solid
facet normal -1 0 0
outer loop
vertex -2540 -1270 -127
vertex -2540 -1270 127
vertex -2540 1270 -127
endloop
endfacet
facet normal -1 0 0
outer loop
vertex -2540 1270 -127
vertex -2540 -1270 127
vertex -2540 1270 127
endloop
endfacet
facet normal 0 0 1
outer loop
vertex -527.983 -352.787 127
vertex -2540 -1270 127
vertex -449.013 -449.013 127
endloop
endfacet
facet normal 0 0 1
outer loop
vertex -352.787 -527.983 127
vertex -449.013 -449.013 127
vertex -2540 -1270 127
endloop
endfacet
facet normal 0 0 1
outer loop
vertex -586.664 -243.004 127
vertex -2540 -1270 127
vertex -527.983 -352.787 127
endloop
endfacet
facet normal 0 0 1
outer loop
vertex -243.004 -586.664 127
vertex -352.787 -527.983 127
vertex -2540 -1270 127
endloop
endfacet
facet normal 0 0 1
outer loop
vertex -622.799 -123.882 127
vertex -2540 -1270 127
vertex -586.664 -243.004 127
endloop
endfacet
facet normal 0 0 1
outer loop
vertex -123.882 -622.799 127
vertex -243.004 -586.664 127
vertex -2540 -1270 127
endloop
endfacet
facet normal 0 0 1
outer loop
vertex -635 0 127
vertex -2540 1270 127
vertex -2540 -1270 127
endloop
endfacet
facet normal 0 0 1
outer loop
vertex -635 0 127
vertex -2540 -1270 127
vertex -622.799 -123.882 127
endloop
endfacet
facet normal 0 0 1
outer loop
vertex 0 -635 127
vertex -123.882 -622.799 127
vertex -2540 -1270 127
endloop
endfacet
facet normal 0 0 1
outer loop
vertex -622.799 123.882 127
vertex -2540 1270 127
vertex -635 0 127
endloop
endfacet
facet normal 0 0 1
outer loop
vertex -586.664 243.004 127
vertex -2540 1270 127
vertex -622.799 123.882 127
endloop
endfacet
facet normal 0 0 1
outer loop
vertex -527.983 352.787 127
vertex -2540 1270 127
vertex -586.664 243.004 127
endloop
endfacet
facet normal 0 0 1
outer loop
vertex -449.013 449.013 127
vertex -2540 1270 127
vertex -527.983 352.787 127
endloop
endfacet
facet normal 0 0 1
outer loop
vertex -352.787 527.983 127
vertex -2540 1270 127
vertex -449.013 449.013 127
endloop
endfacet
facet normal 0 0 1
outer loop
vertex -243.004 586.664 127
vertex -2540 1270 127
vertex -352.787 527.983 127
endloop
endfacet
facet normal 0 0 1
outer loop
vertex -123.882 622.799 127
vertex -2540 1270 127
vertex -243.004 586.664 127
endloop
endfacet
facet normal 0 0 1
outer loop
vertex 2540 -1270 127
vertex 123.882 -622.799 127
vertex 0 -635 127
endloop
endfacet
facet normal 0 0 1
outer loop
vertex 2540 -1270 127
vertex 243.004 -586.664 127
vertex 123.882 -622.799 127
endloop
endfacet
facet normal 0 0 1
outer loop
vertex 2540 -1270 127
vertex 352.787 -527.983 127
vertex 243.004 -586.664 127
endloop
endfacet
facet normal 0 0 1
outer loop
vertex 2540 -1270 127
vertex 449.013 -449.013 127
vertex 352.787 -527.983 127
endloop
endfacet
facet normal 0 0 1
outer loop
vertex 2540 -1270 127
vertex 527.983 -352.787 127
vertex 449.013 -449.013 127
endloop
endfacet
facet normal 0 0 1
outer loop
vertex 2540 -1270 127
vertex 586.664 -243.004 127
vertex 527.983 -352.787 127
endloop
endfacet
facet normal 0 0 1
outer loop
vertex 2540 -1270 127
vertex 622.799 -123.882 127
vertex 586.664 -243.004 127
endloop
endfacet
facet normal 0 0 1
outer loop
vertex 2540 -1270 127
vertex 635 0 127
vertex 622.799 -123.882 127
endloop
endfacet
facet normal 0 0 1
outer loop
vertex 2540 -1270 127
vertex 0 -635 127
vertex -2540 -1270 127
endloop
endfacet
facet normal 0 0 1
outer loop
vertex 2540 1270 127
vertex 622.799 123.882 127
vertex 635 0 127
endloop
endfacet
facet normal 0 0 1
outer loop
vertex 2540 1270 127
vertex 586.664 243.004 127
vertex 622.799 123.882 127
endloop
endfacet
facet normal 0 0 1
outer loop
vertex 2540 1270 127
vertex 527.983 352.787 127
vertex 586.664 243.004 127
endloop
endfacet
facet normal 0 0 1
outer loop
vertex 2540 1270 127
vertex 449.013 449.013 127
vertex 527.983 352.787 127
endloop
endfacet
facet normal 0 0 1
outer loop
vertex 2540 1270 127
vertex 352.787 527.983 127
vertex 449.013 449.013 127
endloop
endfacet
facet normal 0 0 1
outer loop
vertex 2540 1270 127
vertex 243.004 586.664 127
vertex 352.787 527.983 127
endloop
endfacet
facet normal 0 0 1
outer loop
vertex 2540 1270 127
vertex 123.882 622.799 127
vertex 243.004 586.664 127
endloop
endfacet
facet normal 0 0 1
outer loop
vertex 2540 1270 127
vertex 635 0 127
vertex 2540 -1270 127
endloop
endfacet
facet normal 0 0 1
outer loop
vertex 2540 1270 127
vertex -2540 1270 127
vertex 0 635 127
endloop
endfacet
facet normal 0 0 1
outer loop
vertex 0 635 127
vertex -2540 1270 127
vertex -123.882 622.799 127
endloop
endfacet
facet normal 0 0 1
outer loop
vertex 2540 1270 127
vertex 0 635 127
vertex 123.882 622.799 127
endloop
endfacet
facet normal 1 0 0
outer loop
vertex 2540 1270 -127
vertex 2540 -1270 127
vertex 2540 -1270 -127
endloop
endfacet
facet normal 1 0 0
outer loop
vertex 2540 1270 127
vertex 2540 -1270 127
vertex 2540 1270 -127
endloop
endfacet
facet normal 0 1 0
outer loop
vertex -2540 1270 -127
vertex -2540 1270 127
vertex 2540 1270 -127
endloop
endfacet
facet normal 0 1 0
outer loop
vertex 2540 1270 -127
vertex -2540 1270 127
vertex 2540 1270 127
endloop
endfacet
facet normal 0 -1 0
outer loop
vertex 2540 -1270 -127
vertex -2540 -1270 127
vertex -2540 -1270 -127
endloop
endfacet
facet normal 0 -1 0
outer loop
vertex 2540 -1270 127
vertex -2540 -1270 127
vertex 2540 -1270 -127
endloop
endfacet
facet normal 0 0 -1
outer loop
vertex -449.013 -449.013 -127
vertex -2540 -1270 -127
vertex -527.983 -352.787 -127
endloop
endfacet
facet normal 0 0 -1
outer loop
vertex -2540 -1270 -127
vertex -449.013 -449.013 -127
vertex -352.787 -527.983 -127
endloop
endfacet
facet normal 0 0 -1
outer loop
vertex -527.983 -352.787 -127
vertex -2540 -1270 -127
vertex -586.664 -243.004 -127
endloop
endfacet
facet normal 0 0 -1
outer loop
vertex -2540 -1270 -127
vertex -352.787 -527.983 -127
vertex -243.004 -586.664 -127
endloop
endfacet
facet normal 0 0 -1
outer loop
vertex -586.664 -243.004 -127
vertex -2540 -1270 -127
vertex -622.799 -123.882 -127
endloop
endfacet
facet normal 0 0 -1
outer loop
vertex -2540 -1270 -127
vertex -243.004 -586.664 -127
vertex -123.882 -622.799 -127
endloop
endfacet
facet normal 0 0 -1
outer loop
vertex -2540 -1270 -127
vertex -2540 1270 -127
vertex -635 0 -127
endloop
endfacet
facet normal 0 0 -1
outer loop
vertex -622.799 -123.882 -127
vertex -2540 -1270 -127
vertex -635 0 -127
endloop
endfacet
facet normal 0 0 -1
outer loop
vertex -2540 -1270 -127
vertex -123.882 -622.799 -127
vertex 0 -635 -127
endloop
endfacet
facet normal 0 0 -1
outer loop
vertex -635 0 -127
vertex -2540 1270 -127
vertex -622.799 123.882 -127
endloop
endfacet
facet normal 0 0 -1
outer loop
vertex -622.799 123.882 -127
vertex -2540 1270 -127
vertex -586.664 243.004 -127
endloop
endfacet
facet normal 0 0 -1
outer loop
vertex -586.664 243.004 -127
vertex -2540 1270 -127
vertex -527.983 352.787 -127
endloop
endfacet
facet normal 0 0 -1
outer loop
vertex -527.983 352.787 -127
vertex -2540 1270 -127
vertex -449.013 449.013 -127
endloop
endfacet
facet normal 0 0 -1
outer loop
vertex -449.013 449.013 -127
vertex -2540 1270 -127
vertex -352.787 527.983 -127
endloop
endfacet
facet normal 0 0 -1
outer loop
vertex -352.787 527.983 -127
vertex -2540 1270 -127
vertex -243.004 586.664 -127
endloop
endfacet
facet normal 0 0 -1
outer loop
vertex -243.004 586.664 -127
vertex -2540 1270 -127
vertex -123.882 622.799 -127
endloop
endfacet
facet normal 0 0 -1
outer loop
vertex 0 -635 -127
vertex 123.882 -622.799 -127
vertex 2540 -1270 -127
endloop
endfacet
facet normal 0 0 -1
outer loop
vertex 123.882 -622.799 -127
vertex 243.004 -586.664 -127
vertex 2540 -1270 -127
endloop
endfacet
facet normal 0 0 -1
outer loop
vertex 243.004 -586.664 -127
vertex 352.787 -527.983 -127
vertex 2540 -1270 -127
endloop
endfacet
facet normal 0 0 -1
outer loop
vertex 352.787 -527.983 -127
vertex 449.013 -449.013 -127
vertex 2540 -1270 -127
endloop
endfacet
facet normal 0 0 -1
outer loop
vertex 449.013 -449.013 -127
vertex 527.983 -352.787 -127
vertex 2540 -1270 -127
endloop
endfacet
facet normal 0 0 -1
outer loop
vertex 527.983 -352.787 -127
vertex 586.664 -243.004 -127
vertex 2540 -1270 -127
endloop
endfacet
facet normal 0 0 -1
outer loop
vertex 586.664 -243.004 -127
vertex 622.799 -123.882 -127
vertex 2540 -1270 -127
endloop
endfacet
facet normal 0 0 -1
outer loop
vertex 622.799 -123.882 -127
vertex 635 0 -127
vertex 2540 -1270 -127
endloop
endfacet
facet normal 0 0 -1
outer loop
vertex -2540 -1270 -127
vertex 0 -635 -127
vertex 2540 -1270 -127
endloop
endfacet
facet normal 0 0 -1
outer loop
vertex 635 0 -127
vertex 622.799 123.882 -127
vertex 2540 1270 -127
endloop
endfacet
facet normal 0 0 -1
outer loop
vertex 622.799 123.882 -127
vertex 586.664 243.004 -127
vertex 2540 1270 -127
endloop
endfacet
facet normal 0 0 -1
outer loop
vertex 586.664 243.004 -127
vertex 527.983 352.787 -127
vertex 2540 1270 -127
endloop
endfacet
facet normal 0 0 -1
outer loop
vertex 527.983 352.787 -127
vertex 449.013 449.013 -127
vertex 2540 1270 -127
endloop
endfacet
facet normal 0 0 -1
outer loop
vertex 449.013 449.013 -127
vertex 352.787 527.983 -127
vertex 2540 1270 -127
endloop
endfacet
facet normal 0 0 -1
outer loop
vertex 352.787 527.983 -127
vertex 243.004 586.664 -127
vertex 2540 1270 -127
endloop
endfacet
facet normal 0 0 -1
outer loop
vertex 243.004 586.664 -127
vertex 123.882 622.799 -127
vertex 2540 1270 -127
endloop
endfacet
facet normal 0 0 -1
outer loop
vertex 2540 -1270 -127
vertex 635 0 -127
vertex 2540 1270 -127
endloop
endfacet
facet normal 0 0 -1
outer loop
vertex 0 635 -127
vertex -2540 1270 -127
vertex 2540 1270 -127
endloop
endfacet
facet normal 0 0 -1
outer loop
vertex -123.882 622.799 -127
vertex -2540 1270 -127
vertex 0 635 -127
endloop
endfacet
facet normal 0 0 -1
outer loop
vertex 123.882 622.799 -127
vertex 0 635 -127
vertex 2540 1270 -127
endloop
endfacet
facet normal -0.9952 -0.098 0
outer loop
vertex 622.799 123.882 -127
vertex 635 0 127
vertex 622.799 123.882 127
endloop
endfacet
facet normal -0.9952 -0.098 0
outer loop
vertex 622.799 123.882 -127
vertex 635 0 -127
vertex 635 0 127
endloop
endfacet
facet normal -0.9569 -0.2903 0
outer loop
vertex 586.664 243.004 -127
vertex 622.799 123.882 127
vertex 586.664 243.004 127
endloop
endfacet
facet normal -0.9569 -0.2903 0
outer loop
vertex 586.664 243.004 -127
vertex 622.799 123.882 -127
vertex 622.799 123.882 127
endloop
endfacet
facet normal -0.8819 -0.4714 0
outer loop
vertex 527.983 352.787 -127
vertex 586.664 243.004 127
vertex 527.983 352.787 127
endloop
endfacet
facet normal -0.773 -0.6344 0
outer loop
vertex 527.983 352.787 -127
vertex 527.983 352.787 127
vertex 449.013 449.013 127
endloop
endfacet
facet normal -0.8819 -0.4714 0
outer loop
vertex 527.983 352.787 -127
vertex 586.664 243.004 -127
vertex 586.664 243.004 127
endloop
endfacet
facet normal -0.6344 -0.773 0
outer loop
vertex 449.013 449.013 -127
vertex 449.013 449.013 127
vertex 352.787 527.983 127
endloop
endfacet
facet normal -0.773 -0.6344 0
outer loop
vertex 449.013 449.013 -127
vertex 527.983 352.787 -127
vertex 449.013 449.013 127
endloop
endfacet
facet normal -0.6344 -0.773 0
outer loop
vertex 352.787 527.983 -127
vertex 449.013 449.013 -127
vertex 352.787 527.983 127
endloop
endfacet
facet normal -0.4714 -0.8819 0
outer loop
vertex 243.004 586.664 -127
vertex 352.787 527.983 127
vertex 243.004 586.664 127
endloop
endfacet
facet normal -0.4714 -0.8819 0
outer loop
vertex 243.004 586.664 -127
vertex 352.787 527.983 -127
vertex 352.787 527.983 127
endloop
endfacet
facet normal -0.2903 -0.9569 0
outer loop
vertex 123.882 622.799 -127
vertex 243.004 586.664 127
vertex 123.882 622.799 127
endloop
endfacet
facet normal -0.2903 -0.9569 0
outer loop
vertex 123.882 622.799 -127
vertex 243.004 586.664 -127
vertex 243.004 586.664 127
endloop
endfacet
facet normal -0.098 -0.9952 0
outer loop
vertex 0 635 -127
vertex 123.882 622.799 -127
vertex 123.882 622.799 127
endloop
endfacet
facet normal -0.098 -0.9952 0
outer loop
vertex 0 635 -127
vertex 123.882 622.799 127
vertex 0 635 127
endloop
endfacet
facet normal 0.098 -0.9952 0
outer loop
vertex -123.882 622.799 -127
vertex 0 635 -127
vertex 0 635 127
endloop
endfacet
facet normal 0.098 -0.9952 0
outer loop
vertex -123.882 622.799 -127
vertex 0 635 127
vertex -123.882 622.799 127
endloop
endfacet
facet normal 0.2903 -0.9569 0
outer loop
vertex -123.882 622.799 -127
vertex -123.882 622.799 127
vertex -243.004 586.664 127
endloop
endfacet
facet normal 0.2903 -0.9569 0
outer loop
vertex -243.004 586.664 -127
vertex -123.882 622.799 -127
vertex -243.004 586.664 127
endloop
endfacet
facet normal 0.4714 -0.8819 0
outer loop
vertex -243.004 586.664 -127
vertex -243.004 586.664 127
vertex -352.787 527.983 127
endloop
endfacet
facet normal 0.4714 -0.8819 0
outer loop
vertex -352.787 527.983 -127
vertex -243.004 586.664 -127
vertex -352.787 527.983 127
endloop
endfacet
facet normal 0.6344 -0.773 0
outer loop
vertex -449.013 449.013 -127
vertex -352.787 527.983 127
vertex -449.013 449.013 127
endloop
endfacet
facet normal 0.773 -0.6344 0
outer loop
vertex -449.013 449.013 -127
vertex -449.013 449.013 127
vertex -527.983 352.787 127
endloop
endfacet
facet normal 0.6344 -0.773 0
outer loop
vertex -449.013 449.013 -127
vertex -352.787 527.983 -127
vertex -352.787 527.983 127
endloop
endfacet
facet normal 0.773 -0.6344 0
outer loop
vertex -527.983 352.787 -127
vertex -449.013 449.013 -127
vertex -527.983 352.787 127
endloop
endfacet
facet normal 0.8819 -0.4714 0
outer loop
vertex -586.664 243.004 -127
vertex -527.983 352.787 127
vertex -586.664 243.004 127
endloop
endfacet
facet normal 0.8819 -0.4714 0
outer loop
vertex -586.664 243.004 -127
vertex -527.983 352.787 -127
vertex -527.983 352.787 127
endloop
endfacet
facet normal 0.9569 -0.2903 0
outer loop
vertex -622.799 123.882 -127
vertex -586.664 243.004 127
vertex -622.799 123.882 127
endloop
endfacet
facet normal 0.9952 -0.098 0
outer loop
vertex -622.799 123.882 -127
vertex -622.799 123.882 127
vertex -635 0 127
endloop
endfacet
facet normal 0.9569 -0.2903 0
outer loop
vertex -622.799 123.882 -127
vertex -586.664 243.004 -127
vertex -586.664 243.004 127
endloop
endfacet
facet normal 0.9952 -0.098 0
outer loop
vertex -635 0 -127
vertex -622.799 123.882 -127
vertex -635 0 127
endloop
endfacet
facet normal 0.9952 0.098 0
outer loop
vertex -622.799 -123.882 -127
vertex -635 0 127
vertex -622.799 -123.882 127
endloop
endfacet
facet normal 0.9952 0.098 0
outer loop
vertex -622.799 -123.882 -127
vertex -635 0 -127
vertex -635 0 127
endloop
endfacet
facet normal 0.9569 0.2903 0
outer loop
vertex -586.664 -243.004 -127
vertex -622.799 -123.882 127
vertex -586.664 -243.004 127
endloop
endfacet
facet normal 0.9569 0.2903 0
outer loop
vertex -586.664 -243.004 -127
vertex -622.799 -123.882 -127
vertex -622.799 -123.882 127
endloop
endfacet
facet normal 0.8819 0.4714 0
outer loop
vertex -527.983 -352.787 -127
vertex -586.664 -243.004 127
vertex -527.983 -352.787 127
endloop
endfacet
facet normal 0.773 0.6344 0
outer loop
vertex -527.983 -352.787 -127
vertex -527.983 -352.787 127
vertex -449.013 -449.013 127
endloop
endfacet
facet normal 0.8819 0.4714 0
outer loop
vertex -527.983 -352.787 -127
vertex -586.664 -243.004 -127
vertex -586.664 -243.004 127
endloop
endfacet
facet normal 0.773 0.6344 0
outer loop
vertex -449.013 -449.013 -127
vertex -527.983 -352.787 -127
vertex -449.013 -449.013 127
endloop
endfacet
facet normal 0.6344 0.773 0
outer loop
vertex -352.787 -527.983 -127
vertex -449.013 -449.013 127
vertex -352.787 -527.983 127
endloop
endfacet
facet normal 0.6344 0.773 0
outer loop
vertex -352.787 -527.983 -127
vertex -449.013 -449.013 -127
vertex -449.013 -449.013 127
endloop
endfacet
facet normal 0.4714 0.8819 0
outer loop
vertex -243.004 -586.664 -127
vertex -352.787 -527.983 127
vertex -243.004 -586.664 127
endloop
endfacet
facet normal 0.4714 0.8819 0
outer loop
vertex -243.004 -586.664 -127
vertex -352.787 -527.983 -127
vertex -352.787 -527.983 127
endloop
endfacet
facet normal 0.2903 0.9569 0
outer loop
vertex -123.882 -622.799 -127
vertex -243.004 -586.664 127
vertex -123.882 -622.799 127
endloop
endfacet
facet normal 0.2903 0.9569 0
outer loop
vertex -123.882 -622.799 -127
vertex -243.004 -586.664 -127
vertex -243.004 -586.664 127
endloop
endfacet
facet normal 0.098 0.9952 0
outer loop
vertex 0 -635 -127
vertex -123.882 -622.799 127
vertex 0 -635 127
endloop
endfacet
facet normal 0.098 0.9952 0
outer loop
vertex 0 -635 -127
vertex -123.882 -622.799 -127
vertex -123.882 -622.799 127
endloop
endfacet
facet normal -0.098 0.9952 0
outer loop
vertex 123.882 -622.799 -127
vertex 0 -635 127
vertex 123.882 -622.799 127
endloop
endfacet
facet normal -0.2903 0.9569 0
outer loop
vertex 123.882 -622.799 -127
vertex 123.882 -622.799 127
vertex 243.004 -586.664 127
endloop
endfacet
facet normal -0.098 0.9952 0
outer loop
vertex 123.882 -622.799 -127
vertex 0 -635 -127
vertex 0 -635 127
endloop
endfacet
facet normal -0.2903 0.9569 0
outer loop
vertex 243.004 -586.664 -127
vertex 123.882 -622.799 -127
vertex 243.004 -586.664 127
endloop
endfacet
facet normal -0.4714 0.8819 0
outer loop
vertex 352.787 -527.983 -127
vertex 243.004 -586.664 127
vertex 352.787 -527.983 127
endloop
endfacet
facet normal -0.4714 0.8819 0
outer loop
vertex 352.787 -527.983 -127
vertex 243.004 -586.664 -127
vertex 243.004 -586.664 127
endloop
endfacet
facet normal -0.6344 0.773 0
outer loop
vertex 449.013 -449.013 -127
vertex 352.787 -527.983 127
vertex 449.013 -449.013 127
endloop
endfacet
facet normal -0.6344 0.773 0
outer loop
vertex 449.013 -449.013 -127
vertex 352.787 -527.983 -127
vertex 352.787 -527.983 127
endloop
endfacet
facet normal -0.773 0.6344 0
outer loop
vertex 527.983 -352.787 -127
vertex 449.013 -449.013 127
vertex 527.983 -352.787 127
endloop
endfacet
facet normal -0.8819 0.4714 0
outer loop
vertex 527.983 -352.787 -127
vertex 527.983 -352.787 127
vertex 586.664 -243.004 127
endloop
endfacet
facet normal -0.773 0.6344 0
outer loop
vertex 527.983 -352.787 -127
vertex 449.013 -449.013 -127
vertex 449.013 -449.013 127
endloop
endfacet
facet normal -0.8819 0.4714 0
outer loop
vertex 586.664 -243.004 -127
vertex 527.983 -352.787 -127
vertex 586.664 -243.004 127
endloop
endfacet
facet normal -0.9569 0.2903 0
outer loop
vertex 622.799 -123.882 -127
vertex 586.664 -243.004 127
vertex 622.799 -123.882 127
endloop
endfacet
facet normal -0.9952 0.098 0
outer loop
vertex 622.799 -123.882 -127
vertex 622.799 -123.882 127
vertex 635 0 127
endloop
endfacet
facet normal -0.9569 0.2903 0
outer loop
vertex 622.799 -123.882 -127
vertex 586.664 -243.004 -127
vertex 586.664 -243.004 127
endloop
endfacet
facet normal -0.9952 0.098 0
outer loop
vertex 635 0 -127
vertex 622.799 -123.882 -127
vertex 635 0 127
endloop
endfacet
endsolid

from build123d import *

# Parameters (mm, degrees)
SKETCH1_W           = 5080
SKETCH1_H           = 2540
SKETCH1_R           = 635
BOSS_EXTRUDE1_DEPTH = 127


with BuildPart() as part:
    # Sketch1 → Boss-Extrude1 (new body, symmetric)
    with BuildSketch(Plane.XY):
        Rectangle(SKETCH1_W, SKETCH1_H)
        Circle(SKETCH1_R, mode=Mode.SUBTRACT)
    extrude(amount=BOSS_EXTRUDE1_DEPTH, both=True)


solid = part.part
